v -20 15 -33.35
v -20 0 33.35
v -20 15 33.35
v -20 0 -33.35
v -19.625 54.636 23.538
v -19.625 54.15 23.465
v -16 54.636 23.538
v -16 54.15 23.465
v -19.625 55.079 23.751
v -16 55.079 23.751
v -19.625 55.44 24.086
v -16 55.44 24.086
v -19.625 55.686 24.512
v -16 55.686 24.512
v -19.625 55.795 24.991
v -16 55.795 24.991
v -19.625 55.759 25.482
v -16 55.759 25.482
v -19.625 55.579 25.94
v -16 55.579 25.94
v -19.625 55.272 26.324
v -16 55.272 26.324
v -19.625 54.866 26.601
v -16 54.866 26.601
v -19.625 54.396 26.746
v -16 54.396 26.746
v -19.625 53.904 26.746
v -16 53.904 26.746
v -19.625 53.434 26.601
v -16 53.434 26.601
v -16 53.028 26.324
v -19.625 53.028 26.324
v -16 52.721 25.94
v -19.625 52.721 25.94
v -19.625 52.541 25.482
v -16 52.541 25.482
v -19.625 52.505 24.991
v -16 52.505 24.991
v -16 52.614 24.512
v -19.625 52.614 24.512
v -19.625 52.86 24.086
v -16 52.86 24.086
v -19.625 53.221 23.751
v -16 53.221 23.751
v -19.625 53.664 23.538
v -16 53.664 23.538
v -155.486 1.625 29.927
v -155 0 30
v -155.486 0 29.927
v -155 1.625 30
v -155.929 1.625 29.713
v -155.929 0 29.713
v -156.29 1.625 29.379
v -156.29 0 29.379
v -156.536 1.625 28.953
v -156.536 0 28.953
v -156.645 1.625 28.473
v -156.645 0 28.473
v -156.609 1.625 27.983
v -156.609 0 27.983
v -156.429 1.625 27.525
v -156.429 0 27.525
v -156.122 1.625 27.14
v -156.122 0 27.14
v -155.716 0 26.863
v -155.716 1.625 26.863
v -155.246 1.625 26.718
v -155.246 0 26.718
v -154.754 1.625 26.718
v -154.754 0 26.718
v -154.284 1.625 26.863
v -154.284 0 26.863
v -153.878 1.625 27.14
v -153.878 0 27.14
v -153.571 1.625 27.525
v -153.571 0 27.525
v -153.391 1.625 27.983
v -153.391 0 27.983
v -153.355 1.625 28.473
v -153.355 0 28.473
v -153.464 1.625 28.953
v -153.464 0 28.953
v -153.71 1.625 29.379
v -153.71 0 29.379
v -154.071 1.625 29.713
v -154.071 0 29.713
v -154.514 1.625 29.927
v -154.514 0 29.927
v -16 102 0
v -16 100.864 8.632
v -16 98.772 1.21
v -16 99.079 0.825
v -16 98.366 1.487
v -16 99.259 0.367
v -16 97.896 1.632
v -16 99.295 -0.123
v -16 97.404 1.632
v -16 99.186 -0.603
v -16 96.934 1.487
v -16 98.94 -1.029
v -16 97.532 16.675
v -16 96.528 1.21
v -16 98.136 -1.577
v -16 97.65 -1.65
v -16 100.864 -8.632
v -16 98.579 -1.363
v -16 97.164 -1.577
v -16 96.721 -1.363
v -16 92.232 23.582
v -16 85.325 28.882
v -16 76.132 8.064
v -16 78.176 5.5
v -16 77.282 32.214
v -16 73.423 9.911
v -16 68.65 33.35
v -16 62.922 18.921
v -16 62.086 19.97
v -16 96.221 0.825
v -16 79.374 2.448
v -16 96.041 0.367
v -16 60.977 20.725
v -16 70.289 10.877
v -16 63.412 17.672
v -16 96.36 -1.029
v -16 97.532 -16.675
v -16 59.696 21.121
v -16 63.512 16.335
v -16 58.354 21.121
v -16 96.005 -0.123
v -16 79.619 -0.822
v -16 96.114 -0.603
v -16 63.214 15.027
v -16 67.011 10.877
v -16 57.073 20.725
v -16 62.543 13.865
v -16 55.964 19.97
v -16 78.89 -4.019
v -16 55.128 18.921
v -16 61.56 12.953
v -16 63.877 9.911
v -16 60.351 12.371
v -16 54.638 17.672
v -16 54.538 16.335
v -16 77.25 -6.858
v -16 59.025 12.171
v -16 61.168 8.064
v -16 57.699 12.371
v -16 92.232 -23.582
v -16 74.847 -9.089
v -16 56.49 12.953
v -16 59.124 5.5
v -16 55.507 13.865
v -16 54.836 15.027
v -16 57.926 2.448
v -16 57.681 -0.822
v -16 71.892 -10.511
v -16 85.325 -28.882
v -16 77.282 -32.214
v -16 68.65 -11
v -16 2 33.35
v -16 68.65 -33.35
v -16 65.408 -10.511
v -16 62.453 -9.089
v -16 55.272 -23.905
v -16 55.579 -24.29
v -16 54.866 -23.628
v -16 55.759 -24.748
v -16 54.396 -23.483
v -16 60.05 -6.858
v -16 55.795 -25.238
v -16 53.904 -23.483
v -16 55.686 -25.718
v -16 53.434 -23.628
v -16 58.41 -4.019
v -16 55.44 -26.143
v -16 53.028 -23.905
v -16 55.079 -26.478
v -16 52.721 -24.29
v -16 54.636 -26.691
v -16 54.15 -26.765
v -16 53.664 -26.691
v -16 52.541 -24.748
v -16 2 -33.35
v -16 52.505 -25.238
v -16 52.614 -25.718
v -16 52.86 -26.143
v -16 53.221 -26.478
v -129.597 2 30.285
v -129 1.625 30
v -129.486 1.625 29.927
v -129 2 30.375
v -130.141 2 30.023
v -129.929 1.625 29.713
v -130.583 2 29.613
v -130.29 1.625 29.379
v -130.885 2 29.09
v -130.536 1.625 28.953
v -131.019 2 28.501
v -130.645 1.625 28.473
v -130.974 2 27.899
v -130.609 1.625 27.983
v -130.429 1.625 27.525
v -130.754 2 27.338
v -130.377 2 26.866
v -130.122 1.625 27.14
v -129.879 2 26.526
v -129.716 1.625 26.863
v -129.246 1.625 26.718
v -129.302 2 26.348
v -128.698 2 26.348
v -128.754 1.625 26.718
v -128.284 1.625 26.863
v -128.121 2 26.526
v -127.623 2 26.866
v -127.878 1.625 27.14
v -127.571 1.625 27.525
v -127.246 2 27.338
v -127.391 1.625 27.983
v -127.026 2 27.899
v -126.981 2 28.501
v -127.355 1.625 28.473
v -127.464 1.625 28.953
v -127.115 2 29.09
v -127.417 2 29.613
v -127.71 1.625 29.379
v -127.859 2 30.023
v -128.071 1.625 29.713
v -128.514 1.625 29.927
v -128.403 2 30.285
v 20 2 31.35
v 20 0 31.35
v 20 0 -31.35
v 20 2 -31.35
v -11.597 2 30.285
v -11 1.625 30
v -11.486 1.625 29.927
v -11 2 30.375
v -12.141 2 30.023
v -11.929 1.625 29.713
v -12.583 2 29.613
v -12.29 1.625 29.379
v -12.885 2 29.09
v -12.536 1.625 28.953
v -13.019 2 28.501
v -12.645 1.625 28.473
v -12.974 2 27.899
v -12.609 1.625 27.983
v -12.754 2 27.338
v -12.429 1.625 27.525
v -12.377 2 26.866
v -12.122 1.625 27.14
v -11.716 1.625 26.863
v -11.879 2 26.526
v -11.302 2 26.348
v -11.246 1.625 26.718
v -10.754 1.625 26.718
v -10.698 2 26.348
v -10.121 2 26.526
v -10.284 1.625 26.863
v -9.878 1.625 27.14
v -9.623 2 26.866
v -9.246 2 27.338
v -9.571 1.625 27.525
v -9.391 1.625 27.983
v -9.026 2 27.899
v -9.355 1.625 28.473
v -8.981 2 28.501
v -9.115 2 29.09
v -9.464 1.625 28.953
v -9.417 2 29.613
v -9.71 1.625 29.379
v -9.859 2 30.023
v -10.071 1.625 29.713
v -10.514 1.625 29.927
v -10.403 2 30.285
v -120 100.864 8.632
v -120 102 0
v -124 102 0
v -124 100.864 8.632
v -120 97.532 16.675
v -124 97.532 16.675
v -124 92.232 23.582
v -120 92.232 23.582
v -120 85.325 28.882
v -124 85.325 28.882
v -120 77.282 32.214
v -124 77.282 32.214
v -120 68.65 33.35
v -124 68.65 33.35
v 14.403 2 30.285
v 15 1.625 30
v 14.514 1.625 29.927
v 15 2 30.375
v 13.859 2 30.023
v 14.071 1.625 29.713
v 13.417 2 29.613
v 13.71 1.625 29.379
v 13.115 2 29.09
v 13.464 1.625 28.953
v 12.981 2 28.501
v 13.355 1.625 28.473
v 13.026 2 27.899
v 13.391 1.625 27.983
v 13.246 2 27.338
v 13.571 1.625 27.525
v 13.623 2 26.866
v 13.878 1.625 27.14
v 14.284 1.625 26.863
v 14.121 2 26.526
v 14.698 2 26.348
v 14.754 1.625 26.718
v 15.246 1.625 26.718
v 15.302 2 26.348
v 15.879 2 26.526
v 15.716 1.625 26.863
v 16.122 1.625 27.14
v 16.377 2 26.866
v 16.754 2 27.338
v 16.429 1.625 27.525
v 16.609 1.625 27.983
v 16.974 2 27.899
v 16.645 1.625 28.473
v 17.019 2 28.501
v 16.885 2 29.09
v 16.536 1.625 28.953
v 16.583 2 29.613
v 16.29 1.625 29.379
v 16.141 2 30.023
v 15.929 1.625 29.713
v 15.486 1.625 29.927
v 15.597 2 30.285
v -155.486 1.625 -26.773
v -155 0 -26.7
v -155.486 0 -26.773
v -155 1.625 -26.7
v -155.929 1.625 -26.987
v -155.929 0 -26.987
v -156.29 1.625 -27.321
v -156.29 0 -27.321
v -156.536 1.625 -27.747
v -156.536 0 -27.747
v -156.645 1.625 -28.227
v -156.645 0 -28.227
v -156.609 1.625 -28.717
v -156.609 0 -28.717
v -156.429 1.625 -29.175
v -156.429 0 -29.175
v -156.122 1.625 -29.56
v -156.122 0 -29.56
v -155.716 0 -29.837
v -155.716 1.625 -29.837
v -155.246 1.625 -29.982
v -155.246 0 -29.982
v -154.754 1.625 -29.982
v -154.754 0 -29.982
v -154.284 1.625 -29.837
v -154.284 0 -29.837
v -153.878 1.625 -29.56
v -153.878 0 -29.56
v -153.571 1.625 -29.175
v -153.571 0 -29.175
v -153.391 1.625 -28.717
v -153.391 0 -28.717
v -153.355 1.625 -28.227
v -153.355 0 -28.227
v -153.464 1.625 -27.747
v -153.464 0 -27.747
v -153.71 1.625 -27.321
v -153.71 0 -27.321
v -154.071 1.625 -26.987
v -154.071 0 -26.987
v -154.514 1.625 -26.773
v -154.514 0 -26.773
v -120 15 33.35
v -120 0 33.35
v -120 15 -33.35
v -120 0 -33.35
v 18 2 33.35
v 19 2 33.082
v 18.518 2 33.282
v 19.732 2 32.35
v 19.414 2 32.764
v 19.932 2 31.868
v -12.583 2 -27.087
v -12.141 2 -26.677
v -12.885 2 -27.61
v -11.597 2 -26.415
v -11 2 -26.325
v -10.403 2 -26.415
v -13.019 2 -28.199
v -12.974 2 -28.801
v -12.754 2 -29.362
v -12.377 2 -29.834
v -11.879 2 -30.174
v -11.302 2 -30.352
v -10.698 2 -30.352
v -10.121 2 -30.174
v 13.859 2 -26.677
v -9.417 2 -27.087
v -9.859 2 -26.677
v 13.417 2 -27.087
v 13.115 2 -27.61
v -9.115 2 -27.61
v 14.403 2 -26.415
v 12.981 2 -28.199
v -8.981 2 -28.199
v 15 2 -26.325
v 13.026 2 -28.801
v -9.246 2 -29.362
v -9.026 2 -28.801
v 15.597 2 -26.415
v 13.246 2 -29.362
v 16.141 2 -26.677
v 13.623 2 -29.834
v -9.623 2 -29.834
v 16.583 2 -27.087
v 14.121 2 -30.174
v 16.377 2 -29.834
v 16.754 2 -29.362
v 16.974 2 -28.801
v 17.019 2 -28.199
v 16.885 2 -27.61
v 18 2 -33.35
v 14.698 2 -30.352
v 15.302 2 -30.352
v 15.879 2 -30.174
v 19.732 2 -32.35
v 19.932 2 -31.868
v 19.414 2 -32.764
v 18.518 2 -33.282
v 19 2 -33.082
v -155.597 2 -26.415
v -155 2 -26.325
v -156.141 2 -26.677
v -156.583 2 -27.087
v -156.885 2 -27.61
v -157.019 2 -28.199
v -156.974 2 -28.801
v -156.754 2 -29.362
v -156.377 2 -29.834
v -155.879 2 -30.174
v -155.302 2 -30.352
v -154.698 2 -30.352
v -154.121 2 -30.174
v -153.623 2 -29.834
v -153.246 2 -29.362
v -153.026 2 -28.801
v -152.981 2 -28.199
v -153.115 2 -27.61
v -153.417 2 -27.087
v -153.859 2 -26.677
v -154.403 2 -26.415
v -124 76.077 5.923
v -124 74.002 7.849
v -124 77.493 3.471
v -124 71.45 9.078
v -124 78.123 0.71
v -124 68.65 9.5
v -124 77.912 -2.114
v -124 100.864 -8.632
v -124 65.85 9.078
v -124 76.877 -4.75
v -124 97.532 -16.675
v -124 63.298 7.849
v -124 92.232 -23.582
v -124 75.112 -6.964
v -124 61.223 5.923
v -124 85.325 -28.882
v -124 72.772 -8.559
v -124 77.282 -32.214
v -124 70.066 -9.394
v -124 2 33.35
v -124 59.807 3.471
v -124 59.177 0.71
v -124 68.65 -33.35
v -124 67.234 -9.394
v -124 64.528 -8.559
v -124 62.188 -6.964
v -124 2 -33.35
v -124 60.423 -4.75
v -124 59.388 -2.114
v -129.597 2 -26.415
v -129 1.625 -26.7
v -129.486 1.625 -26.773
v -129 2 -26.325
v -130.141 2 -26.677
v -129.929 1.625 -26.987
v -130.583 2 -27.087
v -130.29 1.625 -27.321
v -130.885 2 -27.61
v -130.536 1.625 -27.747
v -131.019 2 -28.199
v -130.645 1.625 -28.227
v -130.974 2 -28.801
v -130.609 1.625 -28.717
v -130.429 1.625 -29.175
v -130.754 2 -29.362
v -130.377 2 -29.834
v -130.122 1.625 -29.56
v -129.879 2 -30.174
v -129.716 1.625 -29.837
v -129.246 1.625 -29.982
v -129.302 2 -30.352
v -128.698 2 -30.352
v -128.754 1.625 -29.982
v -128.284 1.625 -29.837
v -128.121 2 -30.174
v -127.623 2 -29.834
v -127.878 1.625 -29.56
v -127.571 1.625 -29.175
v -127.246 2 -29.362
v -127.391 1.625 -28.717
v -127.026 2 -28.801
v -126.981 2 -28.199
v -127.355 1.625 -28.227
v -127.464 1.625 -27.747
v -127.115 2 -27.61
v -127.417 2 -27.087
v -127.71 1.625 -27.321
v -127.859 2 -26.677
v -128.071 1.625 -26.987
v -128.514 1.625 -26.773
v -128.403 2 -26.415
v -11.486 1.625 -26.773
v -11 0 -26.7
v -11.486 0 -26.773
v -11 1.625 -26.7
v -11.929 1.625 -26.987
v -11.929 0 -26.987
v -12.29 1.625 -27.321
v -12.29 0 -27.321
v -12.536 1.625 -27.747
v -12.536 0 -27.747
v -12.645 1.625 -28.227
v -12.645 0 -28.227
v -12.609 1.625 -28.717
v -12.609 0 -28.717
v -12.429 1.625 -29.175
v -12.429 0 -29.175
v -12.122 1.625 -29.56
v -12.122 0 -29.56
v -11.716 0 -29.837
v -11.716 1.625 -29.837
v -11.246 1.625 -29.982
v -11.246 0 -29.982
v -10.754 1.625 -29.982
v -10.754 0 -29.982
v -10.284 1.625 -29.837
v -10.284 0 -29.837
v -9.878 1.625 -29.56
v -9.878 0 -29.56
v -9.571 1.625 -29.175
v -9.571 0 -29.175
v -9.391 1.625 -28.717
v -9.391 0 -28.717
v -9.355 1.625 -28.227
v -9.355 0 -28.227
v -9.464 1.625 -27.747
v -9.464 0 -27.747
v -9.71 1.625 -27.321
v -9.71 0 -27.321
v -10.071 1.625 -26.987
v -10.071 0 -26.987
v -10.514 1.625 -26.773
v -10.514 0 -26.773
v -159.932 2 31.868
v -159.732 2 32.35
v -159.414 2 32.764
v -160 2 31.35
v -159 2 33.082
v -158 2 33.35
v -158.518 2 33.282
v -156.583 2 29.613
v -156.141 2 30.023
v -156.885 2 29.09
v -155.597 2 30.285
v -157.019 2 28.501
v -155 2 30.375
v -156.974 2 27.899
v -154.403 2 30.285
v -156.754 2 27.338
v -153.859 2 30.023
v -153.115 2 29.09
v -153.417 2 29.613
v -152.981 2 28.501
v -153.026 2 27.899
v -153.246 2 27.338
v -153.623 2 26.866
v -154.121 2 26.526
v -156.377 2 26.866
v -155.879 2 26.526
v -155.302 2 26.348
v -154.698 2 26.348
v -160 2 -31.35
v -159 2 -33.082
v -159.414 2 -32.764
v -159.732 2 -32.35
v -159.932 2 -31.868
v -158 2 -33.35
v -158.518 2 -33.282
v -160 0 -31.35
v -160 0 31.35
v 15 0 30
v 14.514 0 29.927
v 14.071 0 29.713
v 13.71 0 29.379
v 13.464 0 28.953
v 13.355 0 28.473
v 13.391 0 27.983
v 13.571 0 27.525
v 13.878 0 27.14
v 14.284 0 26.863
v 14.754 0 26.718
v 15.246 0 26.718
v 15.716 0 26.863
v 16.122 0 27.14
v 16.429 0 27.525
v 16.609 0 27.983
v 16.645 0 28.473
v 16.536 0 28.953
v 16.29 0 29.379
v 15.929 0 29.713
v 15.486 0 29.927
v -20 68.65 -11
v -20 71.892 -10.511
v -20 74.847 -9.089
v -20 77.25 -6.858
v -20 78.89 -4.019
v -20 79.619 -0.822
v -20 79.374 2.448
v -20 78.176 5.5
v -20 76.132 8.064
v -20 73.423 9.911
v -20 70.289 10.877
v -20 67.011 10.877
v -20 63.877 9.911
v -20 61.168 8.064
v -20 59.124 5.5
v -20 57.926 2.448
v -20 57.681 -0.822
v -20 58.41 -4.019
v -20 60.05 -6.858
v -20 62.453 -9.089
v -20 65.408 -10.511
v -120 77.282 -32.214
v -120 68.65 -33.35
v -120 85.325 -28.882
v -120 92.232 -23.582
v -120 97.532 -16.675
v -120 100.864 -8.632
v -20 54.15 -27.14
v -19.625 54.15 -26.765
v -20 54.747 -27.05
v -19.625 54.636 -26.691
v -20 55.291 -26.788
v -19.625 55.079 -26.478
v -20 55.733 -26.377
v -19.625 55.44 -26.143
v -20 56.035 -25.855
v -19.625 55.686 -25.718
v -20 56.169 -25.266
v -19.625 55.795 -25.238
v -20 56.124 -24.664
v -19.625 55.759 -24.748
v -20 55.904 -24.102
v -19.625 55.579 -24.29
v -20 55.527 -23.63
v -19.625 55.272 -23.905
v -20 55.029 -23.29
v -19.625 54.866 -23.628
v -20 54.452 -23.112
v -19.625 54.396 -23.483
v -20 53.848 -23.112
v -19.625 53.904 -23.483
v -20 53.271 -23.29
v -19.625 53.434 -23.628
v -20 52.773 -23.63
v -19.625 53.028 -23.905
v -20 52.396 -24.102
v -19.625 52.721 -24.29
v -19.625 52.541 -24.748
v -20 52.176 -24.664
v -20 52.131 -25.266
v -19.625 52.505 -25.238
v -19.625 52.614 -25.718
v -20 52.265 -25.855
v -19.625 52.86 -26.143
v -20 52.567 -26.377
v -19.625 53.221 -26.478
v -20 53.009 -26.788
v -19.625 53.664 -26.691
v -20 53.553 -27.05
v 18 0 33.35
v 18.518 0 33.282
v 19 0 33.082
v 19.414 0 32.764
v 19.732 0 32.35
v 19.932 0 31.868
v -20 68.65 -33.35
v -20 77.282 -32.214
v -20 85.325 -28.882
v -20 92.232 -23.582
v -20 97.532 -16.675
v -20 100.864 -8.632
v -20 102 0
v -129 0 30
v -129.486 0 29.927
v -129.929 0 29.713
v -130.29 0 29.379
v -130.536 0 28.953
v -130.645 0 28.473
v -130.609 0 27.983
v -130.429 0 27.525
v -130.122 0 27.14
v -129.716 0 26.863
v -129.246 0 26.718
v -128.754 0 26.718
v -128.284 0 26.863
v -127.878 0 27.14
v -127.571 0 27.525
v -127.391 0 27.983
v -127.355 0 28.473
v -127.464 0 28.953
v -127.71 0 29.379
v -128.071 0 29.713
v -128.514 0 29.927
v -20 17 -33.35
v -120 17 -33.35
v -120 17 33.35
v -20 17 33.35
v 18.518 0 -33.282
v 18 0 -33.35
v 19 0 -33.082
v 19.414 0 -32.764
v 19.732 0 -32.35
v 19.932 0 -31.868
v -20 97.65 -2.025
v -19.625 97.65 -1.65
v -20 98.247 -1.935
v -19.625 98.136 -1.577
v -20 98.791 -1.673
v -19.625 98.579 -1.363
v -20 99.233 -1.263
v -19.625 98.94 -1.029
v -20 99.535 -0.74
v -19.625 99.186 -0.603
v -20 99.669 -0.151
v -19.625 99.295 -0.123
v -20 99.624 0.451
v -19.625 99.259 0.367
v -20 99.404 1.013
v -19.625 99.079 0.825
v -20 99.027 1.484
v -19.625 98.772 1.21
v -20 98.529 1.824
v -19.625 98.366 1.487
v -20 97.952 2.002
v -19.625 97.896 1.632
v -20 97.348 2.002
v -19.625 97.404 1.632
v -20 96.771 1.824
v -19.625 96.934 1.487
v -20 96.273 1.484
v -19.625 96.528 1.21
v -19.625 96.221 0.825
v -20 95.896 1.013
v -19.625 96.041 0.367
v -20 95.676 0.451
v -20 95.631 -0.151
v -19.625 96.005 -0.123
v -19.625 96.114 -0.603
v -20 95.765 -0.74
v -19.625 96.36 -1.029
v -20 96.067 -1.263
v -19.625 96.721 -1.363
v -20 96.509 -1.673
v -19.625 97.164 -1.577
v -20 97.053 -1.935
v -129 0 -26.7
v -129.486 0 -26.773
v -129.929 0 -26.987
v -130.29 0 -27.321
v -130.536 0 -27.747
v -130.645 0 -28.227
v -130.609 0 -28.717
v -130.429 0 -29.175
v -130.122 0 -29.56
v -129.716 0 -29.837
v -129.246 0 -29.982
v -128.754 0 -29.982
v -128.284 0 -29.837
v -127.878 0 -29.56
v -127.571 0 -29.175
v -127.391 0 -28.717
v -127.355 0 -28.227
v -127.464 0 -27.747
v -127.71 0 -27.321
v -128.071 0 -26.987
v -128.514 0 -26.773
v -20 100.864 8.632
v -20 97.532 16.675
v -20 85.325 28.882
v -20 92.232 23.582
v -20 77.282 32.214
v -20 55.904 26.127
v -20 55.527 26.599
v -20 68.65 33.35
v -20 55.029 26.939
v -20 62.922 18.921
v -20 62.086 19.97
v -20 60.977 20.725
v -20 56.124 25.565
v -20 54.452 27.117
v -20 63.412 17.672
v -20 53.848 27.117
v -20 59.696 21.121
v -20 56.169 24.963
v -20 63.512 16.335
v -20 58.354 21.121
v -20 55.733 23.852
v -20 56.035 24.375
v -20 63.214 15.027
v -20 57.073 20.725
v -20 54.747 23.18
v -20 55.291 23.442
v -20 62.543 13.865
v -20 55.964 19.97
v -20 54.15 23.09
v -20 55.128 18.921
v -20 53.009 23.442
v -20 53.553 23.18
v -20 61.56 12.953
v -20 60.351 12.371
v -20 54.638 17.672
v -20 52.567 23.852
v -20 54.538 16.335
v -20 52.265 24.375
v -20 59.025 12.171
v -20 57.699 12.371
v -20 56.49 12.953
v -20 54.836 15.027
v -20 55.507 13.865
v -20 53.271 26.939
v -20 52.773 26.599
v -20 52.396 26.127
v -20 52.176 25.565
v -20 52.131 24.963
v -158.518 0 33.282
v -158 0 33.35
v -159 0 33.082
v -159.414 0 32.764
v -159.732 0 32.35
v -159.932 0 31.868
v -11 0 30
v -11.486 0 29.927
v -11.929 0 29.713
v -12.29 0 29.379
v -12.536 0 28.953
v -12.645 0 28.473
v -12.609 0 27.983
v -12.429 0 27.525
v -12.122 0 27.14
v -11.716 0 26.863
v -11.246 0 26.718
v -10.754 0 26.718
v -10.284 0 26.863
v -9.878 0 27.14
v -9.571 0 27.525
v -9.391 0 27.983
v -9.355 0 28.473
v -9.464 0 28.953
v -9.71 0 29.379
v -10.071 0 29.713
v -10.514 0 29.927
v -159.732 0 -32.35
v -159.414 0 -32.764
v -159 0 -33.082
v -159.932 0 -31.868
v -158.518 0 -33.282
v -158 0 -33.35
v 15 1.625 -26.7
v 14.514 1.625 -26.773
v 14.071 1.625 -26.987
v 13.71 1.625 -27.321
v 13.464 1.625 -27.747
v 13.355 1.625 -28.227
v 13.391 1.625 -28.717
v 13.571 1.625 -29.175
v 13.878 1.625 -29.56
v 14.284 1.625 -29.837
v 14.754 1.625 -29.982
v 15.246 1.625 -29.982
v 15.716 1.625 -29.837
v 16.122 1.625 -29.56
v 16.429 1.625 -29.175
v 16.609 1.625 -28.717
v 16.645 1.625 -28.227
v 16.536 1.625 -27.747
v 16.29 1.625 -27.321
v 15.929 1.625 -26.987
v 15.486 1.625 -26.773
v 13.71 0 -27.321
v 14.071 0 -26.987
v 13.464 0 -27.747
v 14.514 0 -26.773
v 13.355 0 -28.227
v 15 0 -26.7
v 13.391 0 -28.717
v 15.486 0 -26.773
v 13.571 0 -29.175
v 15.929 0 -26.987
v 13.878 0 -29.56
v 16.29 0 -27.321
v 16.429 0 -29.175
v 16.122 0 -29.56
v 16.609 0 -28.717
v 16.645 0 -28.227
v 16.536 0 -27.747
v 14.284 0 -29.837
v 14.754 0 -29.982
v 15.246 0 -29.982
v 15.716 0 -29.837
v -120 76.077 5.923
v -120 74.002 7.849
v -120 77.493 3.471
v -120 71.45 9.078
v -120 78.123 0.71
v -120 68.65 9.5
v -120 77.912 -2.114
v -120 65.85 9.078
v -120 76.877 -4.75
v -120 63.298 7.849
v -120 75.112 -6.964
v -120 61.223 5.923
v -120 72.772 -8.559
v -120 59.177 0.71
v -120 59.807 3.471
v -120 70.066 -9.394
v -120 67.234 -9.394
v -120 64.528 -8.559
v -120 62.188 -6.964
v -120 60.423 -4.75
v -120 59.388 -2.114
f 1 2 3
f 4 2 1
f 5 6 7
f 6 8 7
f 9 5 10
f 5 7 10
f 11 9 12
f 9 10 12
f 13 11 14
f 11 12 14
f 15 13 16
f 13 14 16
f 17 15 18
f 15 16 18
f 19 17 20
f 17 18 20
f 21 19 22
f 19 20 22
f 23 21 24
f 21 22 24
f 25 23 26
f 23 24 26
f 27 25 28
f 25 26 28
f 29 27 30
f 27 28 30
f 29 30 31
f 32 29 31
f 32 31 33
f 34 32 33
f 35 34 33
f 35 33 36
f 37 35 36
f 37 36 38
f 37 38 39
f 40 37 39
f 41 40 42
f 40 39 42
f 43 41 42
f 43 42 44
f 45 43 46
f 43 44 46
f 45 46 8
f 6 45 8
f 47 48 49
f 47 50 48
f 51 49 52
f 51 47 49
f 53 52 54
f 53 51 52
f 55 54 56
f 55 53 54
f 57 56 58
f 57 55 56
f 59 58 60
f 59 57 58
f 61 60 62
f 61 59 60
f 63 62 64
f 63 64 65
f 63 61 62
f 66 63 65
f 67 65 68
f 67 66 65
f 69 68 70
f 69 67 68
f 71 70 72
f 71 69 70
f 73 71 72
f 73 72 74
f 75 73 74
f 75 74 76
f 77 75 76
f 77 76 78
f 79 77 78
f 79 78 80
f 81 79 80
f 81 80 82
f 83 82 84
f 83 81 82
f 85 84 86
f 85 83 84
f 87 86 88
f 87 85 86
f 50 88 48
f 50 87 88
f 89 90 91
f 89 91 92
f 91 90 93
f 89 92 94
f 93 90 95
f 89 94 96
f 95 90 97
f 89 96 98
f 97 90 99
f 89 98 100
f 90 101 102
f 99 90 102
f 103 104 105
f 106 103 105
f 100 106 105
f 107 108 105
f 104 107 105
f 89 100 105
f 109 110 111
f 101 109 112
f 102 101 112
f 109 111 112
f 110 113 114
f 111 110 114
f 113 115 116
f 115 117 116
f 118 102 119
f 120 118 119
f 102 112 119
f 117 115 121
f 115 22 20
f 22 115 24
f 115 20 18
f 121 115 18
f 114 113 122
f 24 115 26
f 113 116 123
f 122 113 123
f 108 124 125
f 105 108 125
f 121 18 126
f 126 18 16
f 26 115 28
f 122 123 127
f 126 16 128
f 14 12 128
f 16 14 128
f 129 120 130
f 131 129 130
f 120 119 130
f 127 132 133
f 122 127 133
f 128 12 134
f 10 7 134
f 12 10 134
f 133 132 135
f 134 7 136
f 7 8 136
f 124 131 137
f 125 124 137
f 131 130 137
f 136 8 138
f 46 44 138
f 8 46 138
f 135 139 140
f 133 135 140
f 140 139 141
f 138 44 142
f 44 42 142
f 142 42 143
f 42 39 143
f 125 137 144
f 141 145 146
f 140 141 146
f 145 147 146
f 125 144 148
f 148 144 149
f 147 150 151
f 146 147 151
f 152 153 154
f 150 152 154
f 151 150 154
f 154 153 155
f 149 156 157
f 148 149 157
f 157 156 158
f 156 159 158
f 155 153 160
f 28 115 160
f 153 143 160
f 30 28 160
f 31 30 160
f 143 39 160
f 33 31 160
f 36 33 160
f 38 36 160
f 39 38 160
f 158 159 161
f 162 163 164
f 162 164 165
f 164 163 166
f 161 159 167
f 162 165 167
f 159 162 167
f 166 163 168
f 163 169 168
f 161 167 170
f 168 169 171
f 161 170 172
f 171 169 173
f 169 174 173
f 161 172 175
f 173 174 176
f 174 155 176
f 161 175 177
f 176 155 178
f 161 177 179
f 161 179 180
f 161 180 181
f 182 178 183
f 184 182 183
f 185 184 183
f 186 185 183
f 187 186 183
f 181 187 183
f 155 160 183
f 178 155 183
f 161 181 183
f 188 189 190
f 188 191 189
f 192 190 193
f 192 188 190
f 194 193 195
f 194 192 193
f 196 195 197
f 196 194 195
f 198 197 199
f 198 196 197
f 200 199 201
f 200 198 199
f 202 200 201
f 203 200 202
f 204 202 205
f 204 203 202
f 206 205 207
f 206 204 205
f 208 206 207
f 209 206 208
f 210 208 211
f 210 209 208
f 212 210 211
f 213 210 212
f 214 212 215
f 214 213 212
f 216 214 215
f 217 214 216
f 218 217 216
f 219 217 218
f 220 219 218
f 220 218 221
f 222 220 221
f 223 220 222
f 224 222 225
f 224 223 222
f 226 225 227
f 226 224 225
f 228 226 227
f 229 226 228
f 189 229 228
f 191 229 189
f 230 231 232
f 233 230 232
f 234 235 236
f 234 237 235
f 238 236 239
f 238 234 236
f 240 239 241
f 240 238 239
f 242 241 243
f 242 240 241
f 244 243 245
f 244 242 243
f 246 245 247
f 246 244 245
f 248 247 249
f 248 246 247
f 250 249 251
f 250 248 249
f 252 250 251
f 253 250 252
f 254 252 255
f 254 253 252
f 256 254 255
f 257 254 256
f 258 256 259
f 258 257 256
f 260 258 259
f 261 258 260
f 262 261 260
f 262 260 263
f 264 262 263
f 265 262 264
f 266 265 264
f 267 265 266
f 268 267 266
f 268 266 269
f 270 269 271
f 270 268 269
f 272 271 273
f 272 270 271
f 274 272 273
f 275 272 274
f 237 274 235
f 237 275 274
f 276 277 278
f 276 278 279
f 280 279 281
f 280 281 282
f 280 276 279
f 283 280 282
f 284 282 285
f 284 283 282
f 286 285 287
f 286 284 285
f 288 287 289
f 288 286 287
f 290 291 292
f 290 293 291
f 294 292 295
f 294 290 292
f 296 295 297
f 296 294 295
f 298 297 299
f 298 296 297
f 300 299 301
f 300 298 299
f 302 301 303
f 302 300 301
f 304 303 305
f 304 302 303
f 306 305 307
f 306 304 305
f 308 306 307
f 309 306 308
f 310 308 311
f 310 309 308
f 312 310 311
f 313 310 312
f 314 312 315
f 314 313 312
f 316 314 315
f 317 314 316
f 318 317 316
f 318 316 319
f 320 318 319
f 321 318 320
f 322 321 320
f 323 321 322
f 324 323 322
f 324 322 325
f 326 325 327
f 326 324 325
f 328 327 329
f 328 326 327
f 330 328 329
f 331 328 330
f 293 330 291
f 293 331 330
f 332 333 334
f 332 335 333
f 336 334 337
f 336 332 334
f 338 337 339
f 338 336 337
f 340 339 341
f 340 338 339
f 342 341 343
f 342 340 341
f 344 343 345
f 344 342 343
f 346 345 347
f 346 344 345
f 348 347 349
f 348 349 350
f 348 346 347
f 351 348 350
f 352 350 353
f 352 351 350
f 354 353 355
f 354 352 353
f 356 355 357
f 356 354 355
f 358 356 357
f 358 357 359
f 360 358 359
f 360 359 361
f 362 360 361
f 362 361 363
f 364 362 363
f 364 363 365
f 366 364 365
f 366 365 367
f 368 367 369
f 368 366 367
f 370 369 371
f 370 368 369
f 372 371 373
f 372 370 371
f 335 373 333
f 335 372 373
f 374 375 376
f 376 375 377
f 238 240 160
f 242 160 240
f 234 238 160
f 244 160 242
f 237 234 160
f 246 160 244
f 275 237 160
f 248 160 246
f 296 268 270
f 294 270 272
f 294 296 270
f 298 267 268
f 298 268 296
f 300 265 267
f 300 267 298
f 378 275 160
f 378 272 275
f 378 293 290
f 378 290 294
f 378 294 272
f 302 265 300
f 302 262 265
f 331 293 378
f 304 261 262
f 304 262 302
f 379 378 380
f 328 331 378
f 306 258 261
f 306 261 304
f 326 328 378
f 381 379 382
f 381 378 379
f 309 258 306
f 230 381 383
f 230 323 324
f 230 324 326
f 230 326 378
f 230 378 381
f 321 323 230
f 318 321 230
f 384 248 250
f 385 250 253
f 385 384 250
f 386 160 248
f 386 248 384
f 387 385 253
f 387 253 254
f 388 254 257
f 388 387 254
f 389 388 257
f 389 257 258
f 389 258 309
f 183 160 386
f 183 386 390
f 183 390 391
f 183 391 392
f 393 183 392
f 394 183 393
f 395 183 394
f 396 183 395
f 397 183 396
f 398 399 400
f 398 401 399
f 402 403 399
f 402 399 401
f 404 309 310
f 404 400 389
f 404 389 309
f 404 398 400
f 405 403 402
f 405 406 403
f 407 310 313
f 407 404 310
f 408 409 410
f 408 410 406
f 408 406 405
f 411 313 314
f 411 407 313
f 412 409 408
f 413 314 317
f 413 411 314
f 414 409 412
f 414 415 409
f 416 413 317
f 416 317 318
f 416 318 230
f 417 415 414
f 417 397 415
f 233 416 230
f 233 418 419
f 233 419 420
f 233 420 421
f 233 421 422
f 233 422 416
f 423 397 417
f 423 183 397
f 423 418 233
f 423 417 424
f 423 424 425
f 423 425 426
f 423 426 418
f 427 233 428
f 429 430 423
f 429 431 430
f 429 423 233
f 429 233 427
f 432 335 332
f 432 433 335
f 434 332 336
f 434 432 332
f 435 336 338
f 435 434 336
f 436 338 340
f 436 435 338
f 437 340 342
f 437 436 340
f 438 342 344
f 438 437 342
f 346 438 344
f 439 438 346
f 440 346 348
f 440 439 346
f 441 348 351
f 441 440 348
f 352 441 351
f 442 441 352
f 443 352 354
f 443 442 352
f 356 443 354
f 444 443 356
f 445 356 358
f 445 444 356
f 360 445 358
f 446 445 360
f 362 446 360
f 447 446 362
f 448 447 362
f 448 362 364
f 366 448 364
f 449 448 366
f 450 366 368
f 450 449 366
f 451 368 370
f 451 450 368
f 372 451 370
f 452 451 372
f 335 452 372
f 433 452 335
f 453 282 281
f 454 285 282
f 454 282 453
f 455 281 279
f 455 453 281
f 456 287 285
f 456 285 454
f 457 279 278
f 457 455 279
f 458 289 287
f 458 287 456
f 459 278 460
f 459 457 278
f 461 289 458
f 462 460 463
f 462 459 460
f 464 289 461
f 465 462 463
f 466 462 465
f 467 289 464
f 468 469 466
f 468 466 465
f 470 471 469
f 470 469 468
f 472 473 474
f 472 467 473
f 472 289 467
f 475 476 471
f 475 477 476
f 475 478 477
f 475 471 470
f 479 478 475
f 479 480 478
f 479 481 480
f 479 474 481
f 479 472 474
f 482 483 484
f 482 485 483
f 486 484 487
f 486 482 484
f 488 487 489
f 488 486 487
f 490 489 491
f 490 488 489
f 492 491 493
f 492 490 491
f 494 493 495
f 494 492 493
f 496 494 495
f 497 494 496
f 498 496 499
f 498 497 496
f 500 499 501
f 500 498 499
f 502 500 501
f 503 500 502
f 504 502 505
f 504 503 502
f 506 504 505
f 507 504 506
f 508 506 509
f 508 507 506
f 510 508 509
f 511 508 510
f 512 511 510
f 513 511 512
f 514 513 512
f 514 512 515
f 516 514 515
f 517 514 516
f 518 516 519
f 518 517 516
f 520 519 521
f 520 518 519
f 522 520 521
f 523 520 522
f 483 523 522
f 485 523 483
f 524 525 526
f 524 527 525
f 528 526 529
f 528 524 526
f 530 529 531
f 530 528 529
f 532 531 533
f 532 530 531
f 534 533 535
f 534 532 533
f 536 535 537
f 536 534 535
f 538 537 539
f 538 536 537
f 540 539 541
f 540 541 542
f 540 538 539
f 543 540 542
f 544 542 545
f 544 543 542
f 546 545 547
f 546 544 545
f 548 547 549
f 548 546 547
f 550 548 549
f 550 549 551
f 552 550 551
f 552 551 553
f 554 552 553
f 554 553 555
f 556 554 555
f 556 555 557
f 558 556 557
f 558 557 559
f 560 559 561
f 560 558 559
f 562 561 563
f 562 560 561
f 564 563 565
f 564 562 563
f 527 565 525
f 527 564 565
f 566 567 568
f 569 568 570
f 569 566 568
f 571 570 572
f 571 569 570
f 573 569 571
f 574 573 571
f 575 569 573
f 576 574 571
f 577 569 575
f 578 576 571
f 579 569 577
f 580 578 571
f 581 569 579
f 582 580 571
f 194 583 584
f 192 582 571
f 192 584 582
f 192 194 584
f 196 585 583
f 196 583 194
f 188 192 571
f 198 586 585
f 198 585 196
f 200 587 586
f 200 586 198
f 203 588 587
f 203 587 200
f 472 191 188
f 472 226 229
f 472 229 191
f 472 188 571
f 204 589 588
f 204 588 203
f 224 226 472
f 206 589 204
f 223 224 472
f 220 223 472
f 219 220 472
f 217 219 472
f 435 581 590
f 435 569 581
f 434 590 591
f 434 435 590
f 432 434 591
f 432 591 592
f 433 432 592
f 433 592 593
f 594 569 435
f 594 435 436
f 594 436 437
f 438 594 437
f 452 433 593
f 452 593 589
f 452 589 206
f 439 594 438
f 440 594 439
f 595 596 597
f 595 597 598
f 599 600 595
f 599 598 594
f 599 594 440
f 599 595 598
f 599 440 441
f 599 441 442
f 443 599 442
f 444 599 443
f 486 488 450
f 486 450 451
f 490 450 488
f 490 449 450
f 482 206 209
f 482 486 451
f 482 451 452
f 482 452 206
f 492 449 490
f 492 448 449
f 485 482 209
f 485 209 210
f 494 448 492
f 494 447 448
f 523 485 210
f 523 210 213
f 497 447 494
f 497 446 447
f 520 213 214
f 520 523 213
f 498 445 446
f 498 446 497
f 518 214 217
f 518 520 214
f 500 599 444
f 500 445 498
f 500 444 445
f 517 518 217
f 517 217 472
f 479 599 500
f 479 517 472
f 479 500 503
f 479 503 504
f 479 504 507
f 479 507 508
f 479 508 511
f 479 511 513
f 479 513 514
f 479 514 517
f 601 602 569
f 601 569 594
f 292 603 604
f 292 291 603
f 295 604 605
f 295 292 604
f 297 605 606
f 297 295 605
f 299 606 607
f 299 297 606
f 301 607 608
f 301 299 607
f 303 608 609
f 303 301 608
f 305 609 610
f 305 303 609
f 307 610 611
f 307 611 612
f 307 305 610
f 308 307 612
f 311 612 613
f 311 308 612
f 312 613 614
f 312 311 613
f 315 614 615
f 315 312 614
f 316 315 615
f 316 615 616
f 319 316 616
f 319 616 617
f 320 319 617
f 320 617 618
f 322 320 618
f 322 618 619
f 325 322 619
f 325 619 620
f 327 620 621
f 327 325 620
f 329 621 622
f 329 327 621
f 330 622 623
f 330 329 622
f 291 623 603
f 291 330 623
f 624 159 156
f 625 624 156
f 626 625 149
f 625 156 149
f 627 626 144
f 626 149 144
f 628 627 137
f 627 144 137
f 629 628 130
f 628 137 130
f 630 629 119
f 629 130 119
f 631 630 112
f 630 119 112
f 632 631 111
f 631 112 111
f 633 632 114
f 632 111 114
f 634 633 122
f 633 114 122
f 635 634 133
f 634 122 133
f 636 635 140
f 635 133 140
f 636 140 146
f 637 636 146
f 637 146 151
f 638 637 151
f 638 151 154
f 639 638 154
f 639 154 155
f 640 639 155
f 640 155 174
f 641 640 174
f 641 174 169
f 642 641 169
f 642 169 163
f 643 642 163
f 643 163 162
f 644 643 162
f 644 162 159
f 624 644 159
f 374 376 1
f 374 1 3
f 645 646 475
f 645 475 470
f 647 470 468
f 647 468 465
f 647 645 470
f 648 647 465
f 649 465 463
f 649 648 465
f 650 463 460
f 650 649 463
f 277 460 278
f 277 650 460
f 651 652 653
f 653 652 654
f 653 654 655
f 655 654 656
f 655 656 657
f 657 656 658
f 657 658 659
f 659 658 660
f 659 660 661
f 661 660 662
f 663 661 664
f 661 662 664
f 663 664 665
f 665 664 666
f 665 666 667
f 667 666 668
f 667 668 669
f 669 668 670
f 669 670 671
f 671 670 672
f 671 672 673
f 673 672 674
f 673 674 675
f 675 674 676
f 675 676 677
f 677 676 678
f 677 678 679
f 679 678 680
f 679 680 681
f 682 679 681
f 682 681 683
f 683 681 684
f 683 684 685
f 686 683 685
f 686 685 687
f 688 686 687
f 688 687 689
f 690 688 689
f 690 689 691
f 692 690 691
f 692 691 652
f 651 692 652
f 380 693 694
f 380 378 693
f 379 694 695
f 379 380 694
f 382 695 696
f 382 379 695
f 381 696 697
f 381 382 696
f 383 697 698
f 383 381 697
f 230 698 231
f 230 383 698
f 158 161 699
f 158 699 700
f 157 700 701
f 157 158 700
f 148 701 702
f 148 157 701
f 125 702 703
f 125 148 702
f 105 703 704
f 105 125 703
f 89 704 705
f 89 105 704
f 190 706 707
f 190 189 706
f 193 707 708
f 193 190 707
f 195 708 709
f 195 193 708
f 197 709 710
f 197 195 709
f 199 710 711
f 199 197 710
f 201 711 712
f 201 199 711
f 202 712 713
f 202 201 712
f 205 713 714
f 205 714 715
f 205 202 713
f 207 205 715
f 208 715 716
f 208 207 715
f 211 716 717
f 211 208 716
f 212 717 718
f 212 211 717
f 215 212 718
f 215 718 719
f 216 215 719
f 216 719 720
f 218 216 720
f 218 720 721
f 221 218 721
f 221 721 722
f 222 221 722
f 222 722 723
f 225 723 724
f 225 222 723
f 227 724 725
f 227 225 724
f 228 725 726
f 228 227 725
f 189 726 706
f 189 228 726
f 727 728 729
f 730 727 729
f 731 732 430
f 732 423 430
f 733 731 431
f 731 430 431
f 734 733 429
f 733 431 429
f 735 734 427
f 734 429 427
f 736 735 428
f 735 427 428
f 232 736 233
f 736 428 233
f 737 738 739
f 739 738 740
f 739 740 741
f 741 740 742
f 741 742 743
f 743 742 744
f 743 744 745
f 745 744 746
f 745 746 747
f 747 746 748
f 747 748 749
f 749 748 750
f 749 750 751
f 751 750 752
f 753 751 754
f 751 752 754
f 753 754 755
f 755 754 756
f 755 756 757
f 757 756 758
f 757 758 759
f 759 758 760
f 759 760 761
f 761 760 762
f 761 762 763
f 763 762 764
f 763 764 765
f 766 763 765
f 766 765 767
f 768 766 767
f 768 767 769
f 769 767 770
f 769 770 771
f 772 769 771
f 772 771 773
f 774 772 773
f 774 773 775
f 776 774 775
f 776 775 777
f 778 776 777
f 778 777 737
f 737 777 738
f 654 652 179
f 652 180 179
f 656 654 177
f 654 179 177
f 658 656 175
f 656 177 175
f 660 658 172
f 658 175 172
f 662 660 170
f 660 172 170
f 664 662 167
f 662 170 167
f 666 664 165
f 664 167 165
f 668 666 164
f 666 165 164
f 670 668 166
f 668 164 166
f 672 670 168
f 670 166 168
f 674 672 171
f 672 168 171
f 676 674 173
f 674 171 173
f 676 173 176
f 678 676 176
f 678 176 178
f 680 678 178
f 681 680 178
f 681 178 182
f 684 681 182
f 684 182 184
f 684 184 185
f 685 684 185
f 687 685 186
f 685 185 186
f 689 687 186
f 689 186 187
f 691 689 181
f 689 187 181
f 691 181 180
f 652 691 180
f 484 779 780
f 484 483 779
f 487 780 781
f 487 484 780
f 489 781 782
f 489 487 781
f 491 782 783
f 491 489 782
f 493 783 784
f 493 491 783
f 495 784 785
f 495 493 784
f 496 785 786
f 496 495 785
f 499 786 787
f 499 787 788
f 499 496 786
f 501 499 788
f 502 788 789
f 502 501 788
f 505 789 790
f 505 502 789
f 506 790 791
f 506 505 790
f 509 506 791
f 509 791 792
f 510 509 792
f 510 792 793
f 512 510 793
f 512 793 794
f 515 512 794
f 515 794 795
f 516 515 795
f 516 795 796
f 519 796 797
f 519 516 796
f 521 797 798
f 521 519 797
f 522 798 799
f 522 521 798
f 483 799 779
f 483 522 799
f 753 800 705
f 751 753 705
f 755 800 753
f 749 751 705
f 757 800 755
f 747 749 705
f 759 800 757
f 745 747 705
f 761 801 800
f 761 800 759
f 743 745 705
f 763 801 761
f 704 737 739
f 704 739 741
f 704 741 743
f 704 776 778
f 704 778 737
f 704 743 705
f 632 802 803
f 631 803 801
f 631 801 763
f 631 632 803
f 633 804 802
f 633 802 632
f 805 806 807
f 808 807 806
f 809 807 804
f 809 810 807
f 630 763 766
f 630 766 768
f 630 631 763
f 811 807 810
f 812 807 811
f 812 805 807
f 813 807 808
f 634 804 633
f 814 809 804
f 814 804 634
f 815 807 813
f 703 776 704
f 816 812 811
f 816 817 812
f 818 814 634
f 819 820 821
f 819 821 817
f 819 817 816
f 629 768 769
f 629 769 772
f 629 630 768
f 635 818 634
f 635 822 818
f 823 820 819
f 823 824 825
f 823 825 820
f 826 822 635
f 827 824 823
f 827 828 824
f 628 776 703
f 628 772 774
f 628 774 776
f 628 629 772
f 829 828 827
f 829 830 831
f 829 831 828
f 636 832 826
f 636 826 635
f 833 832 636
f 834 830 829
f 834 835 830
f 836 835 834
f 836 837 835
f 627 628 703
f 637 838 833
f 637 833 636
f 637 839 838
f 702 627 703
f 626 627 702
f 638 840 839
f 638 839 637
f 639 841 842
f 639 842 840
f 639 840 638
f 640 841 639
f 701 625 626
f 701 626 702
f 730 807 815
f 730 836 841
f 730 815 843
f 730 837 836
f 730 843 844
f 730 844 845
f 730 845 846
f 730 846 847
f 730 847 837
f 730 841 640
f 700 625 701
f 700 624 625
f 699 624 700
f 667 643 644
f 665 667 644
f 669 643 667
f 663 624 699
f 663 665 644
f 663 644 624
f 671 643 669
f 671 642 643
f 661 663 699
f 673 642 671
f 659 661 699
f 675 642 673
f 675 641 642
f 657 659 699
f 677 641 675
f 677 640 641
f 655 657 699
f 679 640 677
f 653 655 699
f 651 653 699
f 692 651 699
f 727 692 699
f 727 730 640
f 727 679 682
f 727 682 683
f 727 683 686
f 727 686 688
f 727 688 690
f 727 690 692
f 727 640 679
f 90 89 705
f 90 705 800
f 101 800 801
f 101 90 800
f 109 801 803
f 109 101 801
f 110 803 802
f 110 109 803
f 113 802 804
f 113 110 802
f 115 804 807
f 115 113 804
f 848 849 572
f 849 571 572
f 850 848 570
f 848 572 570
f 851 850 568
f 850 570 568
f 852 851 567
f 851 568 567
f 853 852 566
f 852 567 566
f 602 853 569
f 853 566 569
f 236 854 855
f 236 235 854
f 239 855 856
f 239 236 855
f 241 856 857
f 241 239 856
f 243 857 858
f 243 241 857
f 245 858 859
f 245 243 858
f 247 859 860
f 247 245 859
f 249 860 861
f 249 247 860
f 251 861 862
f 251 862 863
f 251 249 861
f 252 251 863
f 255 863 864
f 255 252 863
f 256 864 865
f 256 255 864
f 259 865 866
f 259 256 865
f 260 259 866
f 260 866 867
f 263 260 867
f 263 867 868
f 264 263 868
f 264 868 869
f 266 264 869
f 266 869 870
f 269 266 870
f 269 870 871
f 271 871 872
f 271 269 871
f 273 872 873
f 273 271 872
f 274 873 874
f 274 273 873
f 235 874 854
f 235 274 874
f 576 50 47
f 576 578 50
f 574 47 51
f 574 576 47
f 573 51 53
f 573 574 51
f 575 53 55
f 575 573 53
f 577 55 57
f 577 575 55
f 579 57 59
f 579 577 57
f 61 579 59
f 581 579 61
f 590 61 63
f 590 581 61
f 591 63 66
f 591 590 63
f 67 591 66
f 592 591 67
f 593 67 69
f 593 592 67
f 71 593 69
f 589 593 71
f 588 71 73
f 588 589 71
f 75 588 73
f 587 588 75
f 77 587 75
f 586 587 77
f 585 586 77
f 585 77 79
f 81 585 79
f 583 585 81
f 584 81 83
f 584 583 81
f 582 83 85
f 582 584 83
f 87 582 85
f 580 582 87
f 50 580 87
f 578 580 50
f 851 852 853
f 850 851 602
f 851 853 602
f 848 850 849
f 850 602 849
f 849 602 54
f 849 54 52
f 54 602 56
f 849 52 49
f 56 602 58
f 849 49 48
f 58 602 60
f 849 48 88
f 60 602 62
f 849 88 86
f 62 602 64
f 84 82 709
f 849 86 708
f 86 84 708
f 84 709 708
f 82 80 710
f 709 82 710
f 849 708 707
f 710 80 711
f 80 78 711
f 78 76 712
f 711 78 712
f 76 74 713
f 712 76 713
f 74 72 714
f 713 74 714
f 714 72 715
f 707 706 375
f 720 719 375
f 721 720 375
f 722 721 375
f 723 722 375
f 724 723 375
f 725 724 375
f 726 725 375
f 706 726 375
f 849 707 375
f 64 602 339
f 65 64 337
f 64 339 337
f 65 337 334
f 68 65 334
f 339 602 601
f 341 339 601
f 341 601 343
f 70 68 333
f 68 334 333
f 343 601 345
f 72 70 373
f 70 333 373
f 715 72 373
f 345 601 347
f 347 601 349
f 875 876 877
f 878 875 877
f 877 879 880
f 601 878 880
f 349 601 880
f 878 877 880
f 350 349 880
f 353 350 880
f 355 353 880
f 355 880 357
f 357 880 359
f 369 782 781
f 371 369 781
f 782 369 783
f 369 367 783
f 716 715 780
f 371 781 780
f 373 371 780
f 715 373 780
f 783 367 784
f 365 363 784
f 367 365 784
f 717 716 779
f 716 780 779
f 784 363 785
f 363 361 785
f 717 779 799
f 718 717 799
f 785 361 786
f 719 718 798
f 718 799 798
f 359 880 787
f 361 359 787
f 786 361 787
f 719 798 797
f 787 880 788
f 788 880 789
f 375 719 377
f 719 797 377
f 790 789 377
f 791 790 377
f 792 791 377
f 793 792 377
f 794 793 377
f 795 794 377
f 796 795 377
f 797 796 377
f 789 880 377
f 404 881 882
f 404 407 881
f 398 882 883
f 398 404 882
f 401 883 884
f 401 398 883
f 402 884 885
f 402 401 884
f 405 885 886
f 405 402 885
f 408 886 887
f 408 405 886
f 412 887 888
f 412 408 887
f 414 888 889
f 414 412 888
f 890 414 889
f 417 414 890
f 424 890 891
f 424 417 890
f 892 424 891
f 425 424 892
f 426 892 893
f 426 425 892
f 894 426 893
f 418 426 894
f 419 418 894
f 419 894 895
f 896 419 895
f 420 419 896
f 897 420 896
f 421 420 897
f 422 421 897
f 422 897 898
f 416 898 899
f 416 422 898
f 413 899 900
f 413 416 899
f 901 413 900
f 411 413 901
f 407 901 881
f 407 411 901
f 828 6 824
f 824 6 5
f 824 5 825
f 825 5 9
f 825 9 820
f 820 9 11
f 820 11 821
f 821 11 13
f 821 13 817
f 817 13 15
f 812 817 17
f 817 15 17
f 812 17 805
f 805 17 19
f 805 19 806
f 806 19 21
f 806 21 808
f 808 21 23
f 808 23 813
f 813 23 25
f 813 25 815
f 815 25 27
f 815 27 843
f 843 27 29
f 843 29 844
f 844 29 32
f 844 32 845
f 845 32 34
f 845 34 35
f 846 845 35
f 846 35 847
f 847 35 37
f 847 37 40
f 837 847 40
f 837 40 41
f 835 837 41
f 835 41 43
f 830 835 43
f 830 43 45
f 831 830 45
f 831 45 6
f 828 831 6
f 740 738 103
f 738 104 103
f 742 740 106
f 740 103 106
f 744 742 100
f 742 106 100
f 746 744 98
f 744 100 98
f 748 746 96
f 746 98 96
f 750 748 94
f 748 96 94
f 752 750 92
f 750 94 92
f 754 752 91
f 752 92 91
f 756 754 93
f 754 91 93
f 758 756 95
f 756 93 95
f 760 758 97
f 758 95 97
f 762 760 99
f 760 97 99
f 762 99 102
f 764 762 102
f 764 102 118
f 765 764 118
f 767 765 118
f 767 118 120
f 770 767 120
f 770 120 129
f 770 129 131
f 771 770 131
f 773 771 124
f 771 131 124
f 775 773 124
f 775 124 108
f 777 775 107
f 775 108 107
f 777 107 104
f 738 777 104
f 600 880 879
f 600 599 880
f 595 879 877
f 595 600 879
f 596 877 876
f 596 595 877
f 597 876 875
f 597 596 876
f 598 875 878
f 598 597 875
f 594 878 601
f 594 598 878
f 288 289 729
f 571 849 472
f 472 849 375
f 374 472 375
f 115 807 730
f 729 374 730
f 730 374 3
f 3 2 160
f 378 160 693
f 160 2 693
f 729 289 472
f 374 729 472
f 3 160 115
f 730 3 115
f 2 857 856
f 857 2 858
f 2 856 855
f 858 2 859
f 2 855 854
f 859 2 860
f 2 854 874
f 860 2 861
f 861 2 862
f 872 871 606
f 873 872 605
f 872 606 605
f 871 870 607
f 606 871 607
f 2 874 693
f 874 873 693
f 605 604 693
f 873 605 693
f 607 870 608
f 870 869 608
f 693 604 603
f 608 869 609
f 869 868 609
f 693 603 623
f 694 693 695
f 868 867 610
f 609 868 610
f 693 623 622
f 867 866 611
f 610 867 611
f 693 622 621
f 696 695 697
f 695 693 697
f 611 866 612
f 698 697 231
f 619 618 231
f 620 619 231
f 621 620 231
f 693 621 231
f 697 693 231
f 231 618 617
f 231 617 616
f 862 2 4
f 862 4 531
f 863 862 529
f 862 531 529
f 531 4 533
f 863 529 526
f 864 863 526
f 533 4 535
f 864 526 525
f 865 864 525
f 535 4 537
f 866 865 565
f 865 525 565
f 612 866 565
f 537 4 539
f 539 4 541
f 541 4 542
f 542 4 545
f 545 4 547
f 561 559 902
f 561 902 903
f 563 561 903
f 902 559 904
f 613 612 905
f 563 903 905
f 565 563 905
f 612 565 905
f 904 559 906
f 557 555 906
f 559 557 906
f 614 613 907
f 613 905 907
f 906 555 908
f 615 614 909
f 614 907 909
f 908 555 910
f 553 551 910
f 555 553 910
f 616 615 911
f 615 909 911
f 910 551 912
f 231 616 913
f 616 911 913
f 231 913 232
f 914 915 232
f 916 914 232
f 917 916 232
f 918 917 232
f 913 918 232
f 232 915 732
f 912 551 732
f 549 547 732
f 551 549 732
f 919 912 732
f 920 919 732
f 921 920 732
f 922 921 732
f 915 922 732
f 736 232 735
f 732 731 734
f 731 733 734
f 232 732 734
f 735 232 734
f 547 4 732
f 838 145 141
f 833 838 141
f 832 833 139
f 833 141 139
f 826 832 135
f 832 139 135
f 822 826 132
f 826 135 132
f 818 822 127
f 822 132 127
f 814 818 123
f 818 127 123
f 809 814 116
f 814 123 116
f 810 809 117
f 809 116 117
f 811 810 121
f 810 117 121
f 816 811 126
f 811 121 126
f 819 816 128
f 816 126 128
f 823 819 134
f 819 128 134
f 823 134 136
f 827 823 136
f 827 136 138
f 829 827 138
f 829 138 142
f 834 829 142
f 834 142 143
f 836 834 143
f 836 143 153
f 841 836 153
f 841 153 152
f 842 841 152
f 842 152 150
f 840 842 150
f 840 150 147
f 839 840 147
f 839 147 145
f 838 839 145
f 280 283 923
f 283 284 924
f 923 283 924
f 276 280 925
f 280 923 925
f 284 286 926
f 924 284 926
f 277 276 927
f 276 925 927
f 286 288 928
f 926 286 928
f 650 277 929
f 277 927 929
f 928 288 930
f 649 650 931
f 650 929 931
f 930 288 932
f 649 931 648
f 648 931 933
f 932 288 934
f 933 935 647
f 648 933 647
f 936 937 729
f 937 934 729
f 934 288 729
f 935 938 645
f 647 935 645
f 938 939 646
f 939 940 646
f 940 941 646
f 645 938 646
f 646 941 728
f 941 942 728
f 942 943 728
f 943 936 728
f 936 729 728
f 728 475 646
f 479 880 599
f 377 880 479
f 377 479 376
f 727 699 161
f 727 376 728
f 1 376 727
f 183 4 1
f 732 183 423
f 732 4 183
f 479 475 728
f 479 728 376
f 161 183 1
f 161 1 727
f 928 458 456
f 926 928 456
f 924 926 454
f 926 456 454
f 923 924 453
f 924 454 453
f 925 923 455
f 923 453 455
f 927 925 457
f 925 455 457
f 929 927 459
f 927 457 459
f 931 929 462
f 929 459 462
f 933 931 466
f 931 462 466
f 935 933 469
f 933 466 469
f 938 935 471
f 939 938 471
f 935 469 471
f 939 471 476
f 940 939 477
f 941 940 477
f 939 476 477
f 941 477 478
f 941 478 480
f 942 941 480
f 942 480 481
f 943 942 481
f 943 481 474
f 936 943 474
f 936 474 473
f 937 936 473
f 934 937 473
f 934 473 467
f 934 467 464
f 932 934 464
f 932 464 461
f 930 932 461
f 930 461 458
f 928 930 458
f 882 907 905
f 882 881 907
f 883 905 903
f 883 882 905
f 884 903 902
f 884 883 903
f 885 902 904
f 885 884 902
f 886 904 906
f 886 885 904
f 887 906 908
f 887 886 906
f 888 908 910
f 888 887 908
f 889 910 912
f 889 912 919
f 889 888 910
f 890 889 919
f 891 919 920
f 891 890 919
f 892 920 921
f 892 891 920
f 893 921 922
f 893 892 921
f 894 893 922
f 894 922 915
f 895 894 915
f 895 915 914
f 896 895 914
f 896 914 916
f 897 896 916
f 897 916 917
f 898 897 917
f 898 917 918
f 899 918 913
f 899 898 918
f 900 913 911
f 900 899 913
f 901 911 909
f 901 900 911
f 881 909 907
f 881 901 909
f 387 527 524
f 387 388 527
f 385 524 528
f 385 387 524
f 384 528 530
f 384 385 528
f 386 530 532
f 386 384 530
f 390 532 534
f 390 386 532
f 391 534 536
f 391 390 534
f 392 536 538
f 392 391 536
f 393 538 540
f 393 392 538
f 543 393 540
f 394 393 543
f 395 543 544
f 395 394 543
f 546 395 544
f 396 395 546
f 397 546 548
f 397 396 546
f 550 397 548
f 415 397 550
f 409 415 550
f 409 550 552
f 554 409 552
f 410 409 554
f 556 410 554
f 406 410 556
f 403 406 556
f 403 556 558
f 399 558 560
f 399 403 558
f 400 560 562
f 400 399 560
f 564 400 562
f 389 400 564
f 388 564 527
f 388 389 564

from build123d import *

# Parameters (mm, degrees)
SKETCH_1_W                   = 40
SKETCH_1_H                   = 66.7
EXTRUDE_1_DEPTH              = 2
SKETCH_2_W                   = 4
SKETCH_2_H                   = 66.7
EXTRUDE_2_DEPTH              = 100
CUT_EXTRUDE_1_DEPTH          = 115.526077816
CUT_EXTRUDE_1_DEPTH_BACK     = 115.526077816
HOLE_WIZARD_M4_1_D           = 3.3
HOLE_WIZARD_M4_1_CSINK_D     = 4.05
HOLE_WIZARD_M4_1_CSINK_ANGLE = 90
HOLE_WIZARD_M4_2_AT_2_COUNT  = 2
HOLE_WIZARD_M4_2_AT_2_PITCH  = 68.59294731
HOLE_WIZARD_M4_2_AT_3_COUNT  = 2
HOLE_WIZARD_M4_2_AT_3_PITCH  = 26
HOLE_WIZARD_M4_2_AT_4_COUNT  = 2
HOLE_WIZARD_M4_2_AT_4_PITCH  = 62.376998966
HOLE_WIZARD_M4_2_AT_5_COUNT  = 2
HOLE_WIZARD_M4_2_AT_5_PITCH  = 56.7
SKETCH_11_W                  = 66.7
SKETCH_11_H                  = 2
EXTRUDE_3_DEPTH              = 100
SKETCH_13_W                  = 40
SKETCH_13_H                  = 66.7
EXTRUDE_4_DEPTH              = 2
SKETCH_14_W                  = 4
SKETCH_14_H                  = 66.7
EXTRUDE_5_DEPTH              = 100
CUT_EXTRUDE_2_DEPTH          = 180.589037806
CUT_EXTRUDE_2_DEPTH_BACK     = 180.589037806
HOLE_WIZARD_M4_3_AT_2_COUNT  = 2
HOLE_WIZARD_M4_3_AT_2_PITCH  = 26
HOLE_WIZARD_M4_3_AT_3_COUNT  = 2
HOLE_WIZARD_M4_3_AT_3_PITCH  = 62.376998966
HOLE_WIZARD_M4_3_AT_4_COUNT  = 2
HOLE_WIZARD_M4_3_AT_4_PITCH  = 56.7
CUT_EXTRUDE_3_REACH          = 181.589
SKETCH_18_R                  = 9.5
CUT_EXTRUDE_4_REACH          = 181.589
SKETCH_21_R                  = 11
CUT_EXTRUDE_5_REACH          = 181.589
SKETCH_22_R                  = 4.5
FILLET_1_R                   = 2


with BuildPart() as part:
    # 草图1 → 凸台-拉伸1 (new body)
    with BuildSketch(Plane(origin=(0, 0, 0), x_dir=(1, 0, 0), z_dir=(0, 1, 0))):
        Rectangle(SKETCH_1_W, SKETCH_1_H)
    extrude(amount=EXTRUDE_1_DEPTH)

    # 草图2 → 凸台-拉伸2 (add)
    with BuildSketch(Plane(origin=(0, 2, 0), x_dir=(1, 0, 0), z_dir=(0, 1, 0))):
        with Locations((-18, 0)):
            Rectangle(SKETCH_2_W, SKETCH_2_H)
    extrude(amount=EXTRUDE_2_DEPTH)

    # 草图5 → 切除-拉伸1 (cut, two sides: drawn at the far end of the back side and taken through both)
    with BuildSketch(Plane.ZY.offset(20).offset(-CUT_EXTRUDE_1_DEPTH_BACK)):
        with BuildLine():
            ThreePointArc((0, 102), (23.582011153, 92.232011153), (33.35, 68.65))
            Line((33.35, 68.65), (33.35, 102))
            Line((33.35, 102), (0, 102))
        make_face()
        with BuildLine():
            ThreePointArc((-33.35, 68.65), (-23.582011153, 92.232011153), (0, 102))
            Line((0, 102), (-33.35, 102))
            Line((-33.35, 102), (-33.35, 68.65))
        make_face()
    extrude(amount=CUT_EXTRUDE_1_DEPTH + CUT_EXTRUDE_1_DEPTH_BACK, mode=Mode.SUBTRACT)

    # M4 螺纹孔1 (through all)
    with Locations(Plane.ZY.offset(20)):
        with Locations((0, 97.65), (25.11473671, 54.15), (-25.11473671, 54.15)):
            CounterSinkHole(HOLE_WIZARD_M4_1_D / 2, HOLE_WIZARD_M4_1_CSINK_D / 2, counter_sink_angle=HOLE_WIZARD_M4_1_CSINK_ANGLE)

    # 草图10 → M4 螺纹孔2 (revolve, cut)
    with BuildSketch(Plane(origin=(15, 2, -28.35), x_dir=(0, 0, 1), z_dir=(1, 0, 0))):
        Polygon((0, 0), (0, 2), (1.65, 2), (1.65, 0.375), (2.025, 0), align=None)
    hole_wizard_m4_2 = revolve(axis=Axis((15, 8.35, -28.35), (0, -1, 0)), mode=Mode.SUBTRACT)

    # M4 螺纹孔2 at 2: M4 螺纹孔2 ×2
    with Locations(*[Vector(-0.9508085645250022, 0, 0.3097790722852413) * (i * HOLE_WIZARD_M4_2_AT_2_PITCH) for i in range(1, HOLE_WIZARD_M4_2_AT_2_COUNT)]):
        add(hole_wizard_m4_2, mode=Mode.SUBTRACT)

    # M4 螺纹孔2 at 3: M4 螺纹孔2 ×2
    with Locations(*[(-i * HOLE_WIZARD_M4_2_AT_3_PITCH, 0, 0) for i in range(1, HOLE_WIZARD_M4_2_AT_3_COUNT)]):
        add(hole_wizard_m4_2, mode=Mode.SUBTRACT)

    # M4 螺纹孔2 at 4: M4 螺纹孔2 ×2
    with Locations(*[Vector(-0.4168203092647413, 0, 0.9089889052042635) * (i * HOLE_WIZARD_M4_2_AT_4_PITCH) for i in range(1, HOLE_WIZARD_M4_2_AT_4_COUNT)]):
        add(hole_wizard_m4_2, mode=Mode.SUBTRACT)

    # M4 螺纹孔2 at 5: M4 螺纹孔2 ×2
    with Locations(*[(0, 0, i * HOLE_WIZARD_M4_2_AT_5_PITCH) for i in range(1, HOLE_WIZARD_M4_2_AT_5_COUNT)]):
        add(hole_wizard_m4_2, mode=Mode.SUBTRACT)

    # 草图11 → 凸台-拉伸3 (add)
    with BuildSketch(Plane.ZY.offset(20)):
        with Locations((0, 16)):
            Rectangle(SKETCH_11_W, SKETCH_11_H)
    extrude(amount=EXTRUDE_3_DEPTH)



with BuildPart() as body_2:
    # 草图13 → 凸台-拉伸4 (new body)
    with BuildSketch(Plane(origin=(0, 0, 0), x_dir=(1, 0, 0), z_dir=(0, 1, 0))):
        with Locations((-140, 0)):
            Rectangle(SKETCH_13_W, SKETCH_13_H)
    extrude(amount=EXTRUDE_4_DEPTH)


with BuildPart() as part_1:
    add(part.part)

    add(body_2.part)  # 凸台-拉伸5 merges body 2
    # 草图14 → 凸台-拉伸5 (add)
    with BuildSketch(Plane(origin=(0, 2, 0), x_dir=(1, 0, 0), z_dir=(0, 1, 0))):
        with Locations((-122, 0)):
            Rectangle(SKETCH_14_W, SKETCH_14_H)
    extrude(amount=EXTRUDE_5_DEPTH)

    # 草图15 → 切除-拉伸2 (cut, two sides: drawn at the far end of the back side and taken through both)
    with BuildSketch(Plane.ZY.offset(124).offset(-CUT_EXTRUDE_2_DEPTH_BACK)):
        with BuildLine():
            ThreePointArc((0, 102), (23.582011153, 92.232011153), (33.35, 68.65))
            Line((33.35, 68.65), (33.35, 102))
            Line((33.35, 102), (0, 102))
        make_face()
        with BuildLine():
            ThreePointArc((-33.35, 68.65), (-23.582011153, 92.232011153), (0, 102))
            Line((0, 102), (-33.35, 102))
            Line((-33.35, 102), (-33.35, 68.65))
        make_face()
    extrude(amount=CUT_EXTRUDE_2_DEPTH + CUT_EXTRUDE_2_DEPTH_BACK, mode=Mode.SUBTRACT)

    # 草图17 → M4 螺纹孔3 (revolve, cut)
    with BuildSketch(Plane(origin=(-129, 2, -28.35), x_dir=(0, 0, 1), z_dir=(1, 0, 0))):
        Polygon((0, 0), (0, 2), (1.65, 2), (1.65, 0.375), (2.025, 0), align=None)
    hole_wizard_m4_3 = revolve(axis=Axis((-129, 8.35, -28.35), (0, -1, 0)), mode=Mode.SUBTRACT)

    # M4 螺纹孔3 at 2: M4 螺纹孔3 ×2
    with Locations(*[(-i * HOLE_WIZARD_M4_3_AT_2_PITCH, 0, 0) for i in range(1, HOLE_WIZARD_M4_3_AT_2_COUNT)]):
        add(hole_wizard_m4_3, mode=Mode.SUBTRACT)

    # M4 螺纹孔3 at 3: M4 螺纹孔3 ×2
    with Locations(*[Vector(-0.41682030926474106, 0, 0.9089889052042636) * (i * HOLE_WIZARD_M4_3_AT_3_PITCH) for i in range(1, HOLE_WIZARD_M4_3_AT_3_COUNT)]):
        add(hole_wizard_m4_3, mode=Mode.SUBTRACT)

    # M4 螺纹孔3 at 4: M4 螺纹孔3 ×2
    with Locations(*[(0, 0, i * HOLE_WIZARD_M4_3_AT_4_PITCH) for i in range(1, HOLE_WIZARD_M4_3_AT_4_COUNT)]):
        add(hole_wizard_m4_3, mode=Mode.SUBTRACT)

    # 草图18 → 切除-拉伸3 (cut, up to next)
    with BuildSketch(Plane.ZY.offset(124), mode=Mode.PRIVATE) as cut_extrude_3_sk1:
        with Locations((0, 68.65)):
            Circle(SKETCH_18_R)
    cut_extrude_3_tool1 = extrude(cut_extrude_3_sk1.sketch, amount=-CUT_EXTRUDE_3_REACH, mode=Mode.PRIVATE) & part_1.part
    add(cut_extrude_3_tool1.solids().sort_by_distance((-124, 68.65, 0))[0], mode=Mode.SUBTRACT)

    # 草图21 → 切除-拉伸4 (cut, up to next)
    with BuildSketch(Plane(origin=(-16, 0, 0), x_dir=(0, 0, -1), z_dir=(1, 0, 0)), mode=Mode.PRIVATE) as cut_extrude_4_sk1:
        with Locations((0, 68.65)):
            Circle(SKETCH_21_R)
    cut_extrude_4_tool1 = extrude(cut_extrude_4_sk1.sketch, amount=-CUT_EXTRUDE_4_REACH, mode=Mode.PRIVATE) & part_1.part
    add(cut_extrude_4_tool1.solids().sort_by_distance((-16, 68.65, 0))[0], mode=Mode.SUBTRACT)

    # 草图22 → 切除-拉伸5 (cut, up to next)
    with BuildSketch(Plane(origin=(-16, 0, 0), x_dir=(0, 0, -1), z_dir=(1, 0, 0)), mode=Mode.PRIVATE) as cut_extrude_5_sk1:
        with Locations((-16.670989023, 59.025)):
            Circle(SKETCH_22_R)
    cut_extrude_5_tool1 = extrude(cut_extrude_5_sk1.sketch, amount=-CUT_EXTRUDE_5_REACH, mode=Mode.PRIVATE) & part_1.part
    add(cut_extrude_5_tool1.solids().sort_by_distance((-16, 59.025, 16.670989))[0], mode=Mode.SUBTRACT)

    # 圆角1
    fillet_1_edges = [part_1.edges().sort_by_distance(p)[0] for p in [
        (-160, 1, -33.35),
        (-160, 1, 33.35),
        (20, 1, 33.35),
        (20, 1, -33.35),
    ]]
    fillet(fillet_1_edges, radius=FILLET_1_R)


solid = part_1.part
